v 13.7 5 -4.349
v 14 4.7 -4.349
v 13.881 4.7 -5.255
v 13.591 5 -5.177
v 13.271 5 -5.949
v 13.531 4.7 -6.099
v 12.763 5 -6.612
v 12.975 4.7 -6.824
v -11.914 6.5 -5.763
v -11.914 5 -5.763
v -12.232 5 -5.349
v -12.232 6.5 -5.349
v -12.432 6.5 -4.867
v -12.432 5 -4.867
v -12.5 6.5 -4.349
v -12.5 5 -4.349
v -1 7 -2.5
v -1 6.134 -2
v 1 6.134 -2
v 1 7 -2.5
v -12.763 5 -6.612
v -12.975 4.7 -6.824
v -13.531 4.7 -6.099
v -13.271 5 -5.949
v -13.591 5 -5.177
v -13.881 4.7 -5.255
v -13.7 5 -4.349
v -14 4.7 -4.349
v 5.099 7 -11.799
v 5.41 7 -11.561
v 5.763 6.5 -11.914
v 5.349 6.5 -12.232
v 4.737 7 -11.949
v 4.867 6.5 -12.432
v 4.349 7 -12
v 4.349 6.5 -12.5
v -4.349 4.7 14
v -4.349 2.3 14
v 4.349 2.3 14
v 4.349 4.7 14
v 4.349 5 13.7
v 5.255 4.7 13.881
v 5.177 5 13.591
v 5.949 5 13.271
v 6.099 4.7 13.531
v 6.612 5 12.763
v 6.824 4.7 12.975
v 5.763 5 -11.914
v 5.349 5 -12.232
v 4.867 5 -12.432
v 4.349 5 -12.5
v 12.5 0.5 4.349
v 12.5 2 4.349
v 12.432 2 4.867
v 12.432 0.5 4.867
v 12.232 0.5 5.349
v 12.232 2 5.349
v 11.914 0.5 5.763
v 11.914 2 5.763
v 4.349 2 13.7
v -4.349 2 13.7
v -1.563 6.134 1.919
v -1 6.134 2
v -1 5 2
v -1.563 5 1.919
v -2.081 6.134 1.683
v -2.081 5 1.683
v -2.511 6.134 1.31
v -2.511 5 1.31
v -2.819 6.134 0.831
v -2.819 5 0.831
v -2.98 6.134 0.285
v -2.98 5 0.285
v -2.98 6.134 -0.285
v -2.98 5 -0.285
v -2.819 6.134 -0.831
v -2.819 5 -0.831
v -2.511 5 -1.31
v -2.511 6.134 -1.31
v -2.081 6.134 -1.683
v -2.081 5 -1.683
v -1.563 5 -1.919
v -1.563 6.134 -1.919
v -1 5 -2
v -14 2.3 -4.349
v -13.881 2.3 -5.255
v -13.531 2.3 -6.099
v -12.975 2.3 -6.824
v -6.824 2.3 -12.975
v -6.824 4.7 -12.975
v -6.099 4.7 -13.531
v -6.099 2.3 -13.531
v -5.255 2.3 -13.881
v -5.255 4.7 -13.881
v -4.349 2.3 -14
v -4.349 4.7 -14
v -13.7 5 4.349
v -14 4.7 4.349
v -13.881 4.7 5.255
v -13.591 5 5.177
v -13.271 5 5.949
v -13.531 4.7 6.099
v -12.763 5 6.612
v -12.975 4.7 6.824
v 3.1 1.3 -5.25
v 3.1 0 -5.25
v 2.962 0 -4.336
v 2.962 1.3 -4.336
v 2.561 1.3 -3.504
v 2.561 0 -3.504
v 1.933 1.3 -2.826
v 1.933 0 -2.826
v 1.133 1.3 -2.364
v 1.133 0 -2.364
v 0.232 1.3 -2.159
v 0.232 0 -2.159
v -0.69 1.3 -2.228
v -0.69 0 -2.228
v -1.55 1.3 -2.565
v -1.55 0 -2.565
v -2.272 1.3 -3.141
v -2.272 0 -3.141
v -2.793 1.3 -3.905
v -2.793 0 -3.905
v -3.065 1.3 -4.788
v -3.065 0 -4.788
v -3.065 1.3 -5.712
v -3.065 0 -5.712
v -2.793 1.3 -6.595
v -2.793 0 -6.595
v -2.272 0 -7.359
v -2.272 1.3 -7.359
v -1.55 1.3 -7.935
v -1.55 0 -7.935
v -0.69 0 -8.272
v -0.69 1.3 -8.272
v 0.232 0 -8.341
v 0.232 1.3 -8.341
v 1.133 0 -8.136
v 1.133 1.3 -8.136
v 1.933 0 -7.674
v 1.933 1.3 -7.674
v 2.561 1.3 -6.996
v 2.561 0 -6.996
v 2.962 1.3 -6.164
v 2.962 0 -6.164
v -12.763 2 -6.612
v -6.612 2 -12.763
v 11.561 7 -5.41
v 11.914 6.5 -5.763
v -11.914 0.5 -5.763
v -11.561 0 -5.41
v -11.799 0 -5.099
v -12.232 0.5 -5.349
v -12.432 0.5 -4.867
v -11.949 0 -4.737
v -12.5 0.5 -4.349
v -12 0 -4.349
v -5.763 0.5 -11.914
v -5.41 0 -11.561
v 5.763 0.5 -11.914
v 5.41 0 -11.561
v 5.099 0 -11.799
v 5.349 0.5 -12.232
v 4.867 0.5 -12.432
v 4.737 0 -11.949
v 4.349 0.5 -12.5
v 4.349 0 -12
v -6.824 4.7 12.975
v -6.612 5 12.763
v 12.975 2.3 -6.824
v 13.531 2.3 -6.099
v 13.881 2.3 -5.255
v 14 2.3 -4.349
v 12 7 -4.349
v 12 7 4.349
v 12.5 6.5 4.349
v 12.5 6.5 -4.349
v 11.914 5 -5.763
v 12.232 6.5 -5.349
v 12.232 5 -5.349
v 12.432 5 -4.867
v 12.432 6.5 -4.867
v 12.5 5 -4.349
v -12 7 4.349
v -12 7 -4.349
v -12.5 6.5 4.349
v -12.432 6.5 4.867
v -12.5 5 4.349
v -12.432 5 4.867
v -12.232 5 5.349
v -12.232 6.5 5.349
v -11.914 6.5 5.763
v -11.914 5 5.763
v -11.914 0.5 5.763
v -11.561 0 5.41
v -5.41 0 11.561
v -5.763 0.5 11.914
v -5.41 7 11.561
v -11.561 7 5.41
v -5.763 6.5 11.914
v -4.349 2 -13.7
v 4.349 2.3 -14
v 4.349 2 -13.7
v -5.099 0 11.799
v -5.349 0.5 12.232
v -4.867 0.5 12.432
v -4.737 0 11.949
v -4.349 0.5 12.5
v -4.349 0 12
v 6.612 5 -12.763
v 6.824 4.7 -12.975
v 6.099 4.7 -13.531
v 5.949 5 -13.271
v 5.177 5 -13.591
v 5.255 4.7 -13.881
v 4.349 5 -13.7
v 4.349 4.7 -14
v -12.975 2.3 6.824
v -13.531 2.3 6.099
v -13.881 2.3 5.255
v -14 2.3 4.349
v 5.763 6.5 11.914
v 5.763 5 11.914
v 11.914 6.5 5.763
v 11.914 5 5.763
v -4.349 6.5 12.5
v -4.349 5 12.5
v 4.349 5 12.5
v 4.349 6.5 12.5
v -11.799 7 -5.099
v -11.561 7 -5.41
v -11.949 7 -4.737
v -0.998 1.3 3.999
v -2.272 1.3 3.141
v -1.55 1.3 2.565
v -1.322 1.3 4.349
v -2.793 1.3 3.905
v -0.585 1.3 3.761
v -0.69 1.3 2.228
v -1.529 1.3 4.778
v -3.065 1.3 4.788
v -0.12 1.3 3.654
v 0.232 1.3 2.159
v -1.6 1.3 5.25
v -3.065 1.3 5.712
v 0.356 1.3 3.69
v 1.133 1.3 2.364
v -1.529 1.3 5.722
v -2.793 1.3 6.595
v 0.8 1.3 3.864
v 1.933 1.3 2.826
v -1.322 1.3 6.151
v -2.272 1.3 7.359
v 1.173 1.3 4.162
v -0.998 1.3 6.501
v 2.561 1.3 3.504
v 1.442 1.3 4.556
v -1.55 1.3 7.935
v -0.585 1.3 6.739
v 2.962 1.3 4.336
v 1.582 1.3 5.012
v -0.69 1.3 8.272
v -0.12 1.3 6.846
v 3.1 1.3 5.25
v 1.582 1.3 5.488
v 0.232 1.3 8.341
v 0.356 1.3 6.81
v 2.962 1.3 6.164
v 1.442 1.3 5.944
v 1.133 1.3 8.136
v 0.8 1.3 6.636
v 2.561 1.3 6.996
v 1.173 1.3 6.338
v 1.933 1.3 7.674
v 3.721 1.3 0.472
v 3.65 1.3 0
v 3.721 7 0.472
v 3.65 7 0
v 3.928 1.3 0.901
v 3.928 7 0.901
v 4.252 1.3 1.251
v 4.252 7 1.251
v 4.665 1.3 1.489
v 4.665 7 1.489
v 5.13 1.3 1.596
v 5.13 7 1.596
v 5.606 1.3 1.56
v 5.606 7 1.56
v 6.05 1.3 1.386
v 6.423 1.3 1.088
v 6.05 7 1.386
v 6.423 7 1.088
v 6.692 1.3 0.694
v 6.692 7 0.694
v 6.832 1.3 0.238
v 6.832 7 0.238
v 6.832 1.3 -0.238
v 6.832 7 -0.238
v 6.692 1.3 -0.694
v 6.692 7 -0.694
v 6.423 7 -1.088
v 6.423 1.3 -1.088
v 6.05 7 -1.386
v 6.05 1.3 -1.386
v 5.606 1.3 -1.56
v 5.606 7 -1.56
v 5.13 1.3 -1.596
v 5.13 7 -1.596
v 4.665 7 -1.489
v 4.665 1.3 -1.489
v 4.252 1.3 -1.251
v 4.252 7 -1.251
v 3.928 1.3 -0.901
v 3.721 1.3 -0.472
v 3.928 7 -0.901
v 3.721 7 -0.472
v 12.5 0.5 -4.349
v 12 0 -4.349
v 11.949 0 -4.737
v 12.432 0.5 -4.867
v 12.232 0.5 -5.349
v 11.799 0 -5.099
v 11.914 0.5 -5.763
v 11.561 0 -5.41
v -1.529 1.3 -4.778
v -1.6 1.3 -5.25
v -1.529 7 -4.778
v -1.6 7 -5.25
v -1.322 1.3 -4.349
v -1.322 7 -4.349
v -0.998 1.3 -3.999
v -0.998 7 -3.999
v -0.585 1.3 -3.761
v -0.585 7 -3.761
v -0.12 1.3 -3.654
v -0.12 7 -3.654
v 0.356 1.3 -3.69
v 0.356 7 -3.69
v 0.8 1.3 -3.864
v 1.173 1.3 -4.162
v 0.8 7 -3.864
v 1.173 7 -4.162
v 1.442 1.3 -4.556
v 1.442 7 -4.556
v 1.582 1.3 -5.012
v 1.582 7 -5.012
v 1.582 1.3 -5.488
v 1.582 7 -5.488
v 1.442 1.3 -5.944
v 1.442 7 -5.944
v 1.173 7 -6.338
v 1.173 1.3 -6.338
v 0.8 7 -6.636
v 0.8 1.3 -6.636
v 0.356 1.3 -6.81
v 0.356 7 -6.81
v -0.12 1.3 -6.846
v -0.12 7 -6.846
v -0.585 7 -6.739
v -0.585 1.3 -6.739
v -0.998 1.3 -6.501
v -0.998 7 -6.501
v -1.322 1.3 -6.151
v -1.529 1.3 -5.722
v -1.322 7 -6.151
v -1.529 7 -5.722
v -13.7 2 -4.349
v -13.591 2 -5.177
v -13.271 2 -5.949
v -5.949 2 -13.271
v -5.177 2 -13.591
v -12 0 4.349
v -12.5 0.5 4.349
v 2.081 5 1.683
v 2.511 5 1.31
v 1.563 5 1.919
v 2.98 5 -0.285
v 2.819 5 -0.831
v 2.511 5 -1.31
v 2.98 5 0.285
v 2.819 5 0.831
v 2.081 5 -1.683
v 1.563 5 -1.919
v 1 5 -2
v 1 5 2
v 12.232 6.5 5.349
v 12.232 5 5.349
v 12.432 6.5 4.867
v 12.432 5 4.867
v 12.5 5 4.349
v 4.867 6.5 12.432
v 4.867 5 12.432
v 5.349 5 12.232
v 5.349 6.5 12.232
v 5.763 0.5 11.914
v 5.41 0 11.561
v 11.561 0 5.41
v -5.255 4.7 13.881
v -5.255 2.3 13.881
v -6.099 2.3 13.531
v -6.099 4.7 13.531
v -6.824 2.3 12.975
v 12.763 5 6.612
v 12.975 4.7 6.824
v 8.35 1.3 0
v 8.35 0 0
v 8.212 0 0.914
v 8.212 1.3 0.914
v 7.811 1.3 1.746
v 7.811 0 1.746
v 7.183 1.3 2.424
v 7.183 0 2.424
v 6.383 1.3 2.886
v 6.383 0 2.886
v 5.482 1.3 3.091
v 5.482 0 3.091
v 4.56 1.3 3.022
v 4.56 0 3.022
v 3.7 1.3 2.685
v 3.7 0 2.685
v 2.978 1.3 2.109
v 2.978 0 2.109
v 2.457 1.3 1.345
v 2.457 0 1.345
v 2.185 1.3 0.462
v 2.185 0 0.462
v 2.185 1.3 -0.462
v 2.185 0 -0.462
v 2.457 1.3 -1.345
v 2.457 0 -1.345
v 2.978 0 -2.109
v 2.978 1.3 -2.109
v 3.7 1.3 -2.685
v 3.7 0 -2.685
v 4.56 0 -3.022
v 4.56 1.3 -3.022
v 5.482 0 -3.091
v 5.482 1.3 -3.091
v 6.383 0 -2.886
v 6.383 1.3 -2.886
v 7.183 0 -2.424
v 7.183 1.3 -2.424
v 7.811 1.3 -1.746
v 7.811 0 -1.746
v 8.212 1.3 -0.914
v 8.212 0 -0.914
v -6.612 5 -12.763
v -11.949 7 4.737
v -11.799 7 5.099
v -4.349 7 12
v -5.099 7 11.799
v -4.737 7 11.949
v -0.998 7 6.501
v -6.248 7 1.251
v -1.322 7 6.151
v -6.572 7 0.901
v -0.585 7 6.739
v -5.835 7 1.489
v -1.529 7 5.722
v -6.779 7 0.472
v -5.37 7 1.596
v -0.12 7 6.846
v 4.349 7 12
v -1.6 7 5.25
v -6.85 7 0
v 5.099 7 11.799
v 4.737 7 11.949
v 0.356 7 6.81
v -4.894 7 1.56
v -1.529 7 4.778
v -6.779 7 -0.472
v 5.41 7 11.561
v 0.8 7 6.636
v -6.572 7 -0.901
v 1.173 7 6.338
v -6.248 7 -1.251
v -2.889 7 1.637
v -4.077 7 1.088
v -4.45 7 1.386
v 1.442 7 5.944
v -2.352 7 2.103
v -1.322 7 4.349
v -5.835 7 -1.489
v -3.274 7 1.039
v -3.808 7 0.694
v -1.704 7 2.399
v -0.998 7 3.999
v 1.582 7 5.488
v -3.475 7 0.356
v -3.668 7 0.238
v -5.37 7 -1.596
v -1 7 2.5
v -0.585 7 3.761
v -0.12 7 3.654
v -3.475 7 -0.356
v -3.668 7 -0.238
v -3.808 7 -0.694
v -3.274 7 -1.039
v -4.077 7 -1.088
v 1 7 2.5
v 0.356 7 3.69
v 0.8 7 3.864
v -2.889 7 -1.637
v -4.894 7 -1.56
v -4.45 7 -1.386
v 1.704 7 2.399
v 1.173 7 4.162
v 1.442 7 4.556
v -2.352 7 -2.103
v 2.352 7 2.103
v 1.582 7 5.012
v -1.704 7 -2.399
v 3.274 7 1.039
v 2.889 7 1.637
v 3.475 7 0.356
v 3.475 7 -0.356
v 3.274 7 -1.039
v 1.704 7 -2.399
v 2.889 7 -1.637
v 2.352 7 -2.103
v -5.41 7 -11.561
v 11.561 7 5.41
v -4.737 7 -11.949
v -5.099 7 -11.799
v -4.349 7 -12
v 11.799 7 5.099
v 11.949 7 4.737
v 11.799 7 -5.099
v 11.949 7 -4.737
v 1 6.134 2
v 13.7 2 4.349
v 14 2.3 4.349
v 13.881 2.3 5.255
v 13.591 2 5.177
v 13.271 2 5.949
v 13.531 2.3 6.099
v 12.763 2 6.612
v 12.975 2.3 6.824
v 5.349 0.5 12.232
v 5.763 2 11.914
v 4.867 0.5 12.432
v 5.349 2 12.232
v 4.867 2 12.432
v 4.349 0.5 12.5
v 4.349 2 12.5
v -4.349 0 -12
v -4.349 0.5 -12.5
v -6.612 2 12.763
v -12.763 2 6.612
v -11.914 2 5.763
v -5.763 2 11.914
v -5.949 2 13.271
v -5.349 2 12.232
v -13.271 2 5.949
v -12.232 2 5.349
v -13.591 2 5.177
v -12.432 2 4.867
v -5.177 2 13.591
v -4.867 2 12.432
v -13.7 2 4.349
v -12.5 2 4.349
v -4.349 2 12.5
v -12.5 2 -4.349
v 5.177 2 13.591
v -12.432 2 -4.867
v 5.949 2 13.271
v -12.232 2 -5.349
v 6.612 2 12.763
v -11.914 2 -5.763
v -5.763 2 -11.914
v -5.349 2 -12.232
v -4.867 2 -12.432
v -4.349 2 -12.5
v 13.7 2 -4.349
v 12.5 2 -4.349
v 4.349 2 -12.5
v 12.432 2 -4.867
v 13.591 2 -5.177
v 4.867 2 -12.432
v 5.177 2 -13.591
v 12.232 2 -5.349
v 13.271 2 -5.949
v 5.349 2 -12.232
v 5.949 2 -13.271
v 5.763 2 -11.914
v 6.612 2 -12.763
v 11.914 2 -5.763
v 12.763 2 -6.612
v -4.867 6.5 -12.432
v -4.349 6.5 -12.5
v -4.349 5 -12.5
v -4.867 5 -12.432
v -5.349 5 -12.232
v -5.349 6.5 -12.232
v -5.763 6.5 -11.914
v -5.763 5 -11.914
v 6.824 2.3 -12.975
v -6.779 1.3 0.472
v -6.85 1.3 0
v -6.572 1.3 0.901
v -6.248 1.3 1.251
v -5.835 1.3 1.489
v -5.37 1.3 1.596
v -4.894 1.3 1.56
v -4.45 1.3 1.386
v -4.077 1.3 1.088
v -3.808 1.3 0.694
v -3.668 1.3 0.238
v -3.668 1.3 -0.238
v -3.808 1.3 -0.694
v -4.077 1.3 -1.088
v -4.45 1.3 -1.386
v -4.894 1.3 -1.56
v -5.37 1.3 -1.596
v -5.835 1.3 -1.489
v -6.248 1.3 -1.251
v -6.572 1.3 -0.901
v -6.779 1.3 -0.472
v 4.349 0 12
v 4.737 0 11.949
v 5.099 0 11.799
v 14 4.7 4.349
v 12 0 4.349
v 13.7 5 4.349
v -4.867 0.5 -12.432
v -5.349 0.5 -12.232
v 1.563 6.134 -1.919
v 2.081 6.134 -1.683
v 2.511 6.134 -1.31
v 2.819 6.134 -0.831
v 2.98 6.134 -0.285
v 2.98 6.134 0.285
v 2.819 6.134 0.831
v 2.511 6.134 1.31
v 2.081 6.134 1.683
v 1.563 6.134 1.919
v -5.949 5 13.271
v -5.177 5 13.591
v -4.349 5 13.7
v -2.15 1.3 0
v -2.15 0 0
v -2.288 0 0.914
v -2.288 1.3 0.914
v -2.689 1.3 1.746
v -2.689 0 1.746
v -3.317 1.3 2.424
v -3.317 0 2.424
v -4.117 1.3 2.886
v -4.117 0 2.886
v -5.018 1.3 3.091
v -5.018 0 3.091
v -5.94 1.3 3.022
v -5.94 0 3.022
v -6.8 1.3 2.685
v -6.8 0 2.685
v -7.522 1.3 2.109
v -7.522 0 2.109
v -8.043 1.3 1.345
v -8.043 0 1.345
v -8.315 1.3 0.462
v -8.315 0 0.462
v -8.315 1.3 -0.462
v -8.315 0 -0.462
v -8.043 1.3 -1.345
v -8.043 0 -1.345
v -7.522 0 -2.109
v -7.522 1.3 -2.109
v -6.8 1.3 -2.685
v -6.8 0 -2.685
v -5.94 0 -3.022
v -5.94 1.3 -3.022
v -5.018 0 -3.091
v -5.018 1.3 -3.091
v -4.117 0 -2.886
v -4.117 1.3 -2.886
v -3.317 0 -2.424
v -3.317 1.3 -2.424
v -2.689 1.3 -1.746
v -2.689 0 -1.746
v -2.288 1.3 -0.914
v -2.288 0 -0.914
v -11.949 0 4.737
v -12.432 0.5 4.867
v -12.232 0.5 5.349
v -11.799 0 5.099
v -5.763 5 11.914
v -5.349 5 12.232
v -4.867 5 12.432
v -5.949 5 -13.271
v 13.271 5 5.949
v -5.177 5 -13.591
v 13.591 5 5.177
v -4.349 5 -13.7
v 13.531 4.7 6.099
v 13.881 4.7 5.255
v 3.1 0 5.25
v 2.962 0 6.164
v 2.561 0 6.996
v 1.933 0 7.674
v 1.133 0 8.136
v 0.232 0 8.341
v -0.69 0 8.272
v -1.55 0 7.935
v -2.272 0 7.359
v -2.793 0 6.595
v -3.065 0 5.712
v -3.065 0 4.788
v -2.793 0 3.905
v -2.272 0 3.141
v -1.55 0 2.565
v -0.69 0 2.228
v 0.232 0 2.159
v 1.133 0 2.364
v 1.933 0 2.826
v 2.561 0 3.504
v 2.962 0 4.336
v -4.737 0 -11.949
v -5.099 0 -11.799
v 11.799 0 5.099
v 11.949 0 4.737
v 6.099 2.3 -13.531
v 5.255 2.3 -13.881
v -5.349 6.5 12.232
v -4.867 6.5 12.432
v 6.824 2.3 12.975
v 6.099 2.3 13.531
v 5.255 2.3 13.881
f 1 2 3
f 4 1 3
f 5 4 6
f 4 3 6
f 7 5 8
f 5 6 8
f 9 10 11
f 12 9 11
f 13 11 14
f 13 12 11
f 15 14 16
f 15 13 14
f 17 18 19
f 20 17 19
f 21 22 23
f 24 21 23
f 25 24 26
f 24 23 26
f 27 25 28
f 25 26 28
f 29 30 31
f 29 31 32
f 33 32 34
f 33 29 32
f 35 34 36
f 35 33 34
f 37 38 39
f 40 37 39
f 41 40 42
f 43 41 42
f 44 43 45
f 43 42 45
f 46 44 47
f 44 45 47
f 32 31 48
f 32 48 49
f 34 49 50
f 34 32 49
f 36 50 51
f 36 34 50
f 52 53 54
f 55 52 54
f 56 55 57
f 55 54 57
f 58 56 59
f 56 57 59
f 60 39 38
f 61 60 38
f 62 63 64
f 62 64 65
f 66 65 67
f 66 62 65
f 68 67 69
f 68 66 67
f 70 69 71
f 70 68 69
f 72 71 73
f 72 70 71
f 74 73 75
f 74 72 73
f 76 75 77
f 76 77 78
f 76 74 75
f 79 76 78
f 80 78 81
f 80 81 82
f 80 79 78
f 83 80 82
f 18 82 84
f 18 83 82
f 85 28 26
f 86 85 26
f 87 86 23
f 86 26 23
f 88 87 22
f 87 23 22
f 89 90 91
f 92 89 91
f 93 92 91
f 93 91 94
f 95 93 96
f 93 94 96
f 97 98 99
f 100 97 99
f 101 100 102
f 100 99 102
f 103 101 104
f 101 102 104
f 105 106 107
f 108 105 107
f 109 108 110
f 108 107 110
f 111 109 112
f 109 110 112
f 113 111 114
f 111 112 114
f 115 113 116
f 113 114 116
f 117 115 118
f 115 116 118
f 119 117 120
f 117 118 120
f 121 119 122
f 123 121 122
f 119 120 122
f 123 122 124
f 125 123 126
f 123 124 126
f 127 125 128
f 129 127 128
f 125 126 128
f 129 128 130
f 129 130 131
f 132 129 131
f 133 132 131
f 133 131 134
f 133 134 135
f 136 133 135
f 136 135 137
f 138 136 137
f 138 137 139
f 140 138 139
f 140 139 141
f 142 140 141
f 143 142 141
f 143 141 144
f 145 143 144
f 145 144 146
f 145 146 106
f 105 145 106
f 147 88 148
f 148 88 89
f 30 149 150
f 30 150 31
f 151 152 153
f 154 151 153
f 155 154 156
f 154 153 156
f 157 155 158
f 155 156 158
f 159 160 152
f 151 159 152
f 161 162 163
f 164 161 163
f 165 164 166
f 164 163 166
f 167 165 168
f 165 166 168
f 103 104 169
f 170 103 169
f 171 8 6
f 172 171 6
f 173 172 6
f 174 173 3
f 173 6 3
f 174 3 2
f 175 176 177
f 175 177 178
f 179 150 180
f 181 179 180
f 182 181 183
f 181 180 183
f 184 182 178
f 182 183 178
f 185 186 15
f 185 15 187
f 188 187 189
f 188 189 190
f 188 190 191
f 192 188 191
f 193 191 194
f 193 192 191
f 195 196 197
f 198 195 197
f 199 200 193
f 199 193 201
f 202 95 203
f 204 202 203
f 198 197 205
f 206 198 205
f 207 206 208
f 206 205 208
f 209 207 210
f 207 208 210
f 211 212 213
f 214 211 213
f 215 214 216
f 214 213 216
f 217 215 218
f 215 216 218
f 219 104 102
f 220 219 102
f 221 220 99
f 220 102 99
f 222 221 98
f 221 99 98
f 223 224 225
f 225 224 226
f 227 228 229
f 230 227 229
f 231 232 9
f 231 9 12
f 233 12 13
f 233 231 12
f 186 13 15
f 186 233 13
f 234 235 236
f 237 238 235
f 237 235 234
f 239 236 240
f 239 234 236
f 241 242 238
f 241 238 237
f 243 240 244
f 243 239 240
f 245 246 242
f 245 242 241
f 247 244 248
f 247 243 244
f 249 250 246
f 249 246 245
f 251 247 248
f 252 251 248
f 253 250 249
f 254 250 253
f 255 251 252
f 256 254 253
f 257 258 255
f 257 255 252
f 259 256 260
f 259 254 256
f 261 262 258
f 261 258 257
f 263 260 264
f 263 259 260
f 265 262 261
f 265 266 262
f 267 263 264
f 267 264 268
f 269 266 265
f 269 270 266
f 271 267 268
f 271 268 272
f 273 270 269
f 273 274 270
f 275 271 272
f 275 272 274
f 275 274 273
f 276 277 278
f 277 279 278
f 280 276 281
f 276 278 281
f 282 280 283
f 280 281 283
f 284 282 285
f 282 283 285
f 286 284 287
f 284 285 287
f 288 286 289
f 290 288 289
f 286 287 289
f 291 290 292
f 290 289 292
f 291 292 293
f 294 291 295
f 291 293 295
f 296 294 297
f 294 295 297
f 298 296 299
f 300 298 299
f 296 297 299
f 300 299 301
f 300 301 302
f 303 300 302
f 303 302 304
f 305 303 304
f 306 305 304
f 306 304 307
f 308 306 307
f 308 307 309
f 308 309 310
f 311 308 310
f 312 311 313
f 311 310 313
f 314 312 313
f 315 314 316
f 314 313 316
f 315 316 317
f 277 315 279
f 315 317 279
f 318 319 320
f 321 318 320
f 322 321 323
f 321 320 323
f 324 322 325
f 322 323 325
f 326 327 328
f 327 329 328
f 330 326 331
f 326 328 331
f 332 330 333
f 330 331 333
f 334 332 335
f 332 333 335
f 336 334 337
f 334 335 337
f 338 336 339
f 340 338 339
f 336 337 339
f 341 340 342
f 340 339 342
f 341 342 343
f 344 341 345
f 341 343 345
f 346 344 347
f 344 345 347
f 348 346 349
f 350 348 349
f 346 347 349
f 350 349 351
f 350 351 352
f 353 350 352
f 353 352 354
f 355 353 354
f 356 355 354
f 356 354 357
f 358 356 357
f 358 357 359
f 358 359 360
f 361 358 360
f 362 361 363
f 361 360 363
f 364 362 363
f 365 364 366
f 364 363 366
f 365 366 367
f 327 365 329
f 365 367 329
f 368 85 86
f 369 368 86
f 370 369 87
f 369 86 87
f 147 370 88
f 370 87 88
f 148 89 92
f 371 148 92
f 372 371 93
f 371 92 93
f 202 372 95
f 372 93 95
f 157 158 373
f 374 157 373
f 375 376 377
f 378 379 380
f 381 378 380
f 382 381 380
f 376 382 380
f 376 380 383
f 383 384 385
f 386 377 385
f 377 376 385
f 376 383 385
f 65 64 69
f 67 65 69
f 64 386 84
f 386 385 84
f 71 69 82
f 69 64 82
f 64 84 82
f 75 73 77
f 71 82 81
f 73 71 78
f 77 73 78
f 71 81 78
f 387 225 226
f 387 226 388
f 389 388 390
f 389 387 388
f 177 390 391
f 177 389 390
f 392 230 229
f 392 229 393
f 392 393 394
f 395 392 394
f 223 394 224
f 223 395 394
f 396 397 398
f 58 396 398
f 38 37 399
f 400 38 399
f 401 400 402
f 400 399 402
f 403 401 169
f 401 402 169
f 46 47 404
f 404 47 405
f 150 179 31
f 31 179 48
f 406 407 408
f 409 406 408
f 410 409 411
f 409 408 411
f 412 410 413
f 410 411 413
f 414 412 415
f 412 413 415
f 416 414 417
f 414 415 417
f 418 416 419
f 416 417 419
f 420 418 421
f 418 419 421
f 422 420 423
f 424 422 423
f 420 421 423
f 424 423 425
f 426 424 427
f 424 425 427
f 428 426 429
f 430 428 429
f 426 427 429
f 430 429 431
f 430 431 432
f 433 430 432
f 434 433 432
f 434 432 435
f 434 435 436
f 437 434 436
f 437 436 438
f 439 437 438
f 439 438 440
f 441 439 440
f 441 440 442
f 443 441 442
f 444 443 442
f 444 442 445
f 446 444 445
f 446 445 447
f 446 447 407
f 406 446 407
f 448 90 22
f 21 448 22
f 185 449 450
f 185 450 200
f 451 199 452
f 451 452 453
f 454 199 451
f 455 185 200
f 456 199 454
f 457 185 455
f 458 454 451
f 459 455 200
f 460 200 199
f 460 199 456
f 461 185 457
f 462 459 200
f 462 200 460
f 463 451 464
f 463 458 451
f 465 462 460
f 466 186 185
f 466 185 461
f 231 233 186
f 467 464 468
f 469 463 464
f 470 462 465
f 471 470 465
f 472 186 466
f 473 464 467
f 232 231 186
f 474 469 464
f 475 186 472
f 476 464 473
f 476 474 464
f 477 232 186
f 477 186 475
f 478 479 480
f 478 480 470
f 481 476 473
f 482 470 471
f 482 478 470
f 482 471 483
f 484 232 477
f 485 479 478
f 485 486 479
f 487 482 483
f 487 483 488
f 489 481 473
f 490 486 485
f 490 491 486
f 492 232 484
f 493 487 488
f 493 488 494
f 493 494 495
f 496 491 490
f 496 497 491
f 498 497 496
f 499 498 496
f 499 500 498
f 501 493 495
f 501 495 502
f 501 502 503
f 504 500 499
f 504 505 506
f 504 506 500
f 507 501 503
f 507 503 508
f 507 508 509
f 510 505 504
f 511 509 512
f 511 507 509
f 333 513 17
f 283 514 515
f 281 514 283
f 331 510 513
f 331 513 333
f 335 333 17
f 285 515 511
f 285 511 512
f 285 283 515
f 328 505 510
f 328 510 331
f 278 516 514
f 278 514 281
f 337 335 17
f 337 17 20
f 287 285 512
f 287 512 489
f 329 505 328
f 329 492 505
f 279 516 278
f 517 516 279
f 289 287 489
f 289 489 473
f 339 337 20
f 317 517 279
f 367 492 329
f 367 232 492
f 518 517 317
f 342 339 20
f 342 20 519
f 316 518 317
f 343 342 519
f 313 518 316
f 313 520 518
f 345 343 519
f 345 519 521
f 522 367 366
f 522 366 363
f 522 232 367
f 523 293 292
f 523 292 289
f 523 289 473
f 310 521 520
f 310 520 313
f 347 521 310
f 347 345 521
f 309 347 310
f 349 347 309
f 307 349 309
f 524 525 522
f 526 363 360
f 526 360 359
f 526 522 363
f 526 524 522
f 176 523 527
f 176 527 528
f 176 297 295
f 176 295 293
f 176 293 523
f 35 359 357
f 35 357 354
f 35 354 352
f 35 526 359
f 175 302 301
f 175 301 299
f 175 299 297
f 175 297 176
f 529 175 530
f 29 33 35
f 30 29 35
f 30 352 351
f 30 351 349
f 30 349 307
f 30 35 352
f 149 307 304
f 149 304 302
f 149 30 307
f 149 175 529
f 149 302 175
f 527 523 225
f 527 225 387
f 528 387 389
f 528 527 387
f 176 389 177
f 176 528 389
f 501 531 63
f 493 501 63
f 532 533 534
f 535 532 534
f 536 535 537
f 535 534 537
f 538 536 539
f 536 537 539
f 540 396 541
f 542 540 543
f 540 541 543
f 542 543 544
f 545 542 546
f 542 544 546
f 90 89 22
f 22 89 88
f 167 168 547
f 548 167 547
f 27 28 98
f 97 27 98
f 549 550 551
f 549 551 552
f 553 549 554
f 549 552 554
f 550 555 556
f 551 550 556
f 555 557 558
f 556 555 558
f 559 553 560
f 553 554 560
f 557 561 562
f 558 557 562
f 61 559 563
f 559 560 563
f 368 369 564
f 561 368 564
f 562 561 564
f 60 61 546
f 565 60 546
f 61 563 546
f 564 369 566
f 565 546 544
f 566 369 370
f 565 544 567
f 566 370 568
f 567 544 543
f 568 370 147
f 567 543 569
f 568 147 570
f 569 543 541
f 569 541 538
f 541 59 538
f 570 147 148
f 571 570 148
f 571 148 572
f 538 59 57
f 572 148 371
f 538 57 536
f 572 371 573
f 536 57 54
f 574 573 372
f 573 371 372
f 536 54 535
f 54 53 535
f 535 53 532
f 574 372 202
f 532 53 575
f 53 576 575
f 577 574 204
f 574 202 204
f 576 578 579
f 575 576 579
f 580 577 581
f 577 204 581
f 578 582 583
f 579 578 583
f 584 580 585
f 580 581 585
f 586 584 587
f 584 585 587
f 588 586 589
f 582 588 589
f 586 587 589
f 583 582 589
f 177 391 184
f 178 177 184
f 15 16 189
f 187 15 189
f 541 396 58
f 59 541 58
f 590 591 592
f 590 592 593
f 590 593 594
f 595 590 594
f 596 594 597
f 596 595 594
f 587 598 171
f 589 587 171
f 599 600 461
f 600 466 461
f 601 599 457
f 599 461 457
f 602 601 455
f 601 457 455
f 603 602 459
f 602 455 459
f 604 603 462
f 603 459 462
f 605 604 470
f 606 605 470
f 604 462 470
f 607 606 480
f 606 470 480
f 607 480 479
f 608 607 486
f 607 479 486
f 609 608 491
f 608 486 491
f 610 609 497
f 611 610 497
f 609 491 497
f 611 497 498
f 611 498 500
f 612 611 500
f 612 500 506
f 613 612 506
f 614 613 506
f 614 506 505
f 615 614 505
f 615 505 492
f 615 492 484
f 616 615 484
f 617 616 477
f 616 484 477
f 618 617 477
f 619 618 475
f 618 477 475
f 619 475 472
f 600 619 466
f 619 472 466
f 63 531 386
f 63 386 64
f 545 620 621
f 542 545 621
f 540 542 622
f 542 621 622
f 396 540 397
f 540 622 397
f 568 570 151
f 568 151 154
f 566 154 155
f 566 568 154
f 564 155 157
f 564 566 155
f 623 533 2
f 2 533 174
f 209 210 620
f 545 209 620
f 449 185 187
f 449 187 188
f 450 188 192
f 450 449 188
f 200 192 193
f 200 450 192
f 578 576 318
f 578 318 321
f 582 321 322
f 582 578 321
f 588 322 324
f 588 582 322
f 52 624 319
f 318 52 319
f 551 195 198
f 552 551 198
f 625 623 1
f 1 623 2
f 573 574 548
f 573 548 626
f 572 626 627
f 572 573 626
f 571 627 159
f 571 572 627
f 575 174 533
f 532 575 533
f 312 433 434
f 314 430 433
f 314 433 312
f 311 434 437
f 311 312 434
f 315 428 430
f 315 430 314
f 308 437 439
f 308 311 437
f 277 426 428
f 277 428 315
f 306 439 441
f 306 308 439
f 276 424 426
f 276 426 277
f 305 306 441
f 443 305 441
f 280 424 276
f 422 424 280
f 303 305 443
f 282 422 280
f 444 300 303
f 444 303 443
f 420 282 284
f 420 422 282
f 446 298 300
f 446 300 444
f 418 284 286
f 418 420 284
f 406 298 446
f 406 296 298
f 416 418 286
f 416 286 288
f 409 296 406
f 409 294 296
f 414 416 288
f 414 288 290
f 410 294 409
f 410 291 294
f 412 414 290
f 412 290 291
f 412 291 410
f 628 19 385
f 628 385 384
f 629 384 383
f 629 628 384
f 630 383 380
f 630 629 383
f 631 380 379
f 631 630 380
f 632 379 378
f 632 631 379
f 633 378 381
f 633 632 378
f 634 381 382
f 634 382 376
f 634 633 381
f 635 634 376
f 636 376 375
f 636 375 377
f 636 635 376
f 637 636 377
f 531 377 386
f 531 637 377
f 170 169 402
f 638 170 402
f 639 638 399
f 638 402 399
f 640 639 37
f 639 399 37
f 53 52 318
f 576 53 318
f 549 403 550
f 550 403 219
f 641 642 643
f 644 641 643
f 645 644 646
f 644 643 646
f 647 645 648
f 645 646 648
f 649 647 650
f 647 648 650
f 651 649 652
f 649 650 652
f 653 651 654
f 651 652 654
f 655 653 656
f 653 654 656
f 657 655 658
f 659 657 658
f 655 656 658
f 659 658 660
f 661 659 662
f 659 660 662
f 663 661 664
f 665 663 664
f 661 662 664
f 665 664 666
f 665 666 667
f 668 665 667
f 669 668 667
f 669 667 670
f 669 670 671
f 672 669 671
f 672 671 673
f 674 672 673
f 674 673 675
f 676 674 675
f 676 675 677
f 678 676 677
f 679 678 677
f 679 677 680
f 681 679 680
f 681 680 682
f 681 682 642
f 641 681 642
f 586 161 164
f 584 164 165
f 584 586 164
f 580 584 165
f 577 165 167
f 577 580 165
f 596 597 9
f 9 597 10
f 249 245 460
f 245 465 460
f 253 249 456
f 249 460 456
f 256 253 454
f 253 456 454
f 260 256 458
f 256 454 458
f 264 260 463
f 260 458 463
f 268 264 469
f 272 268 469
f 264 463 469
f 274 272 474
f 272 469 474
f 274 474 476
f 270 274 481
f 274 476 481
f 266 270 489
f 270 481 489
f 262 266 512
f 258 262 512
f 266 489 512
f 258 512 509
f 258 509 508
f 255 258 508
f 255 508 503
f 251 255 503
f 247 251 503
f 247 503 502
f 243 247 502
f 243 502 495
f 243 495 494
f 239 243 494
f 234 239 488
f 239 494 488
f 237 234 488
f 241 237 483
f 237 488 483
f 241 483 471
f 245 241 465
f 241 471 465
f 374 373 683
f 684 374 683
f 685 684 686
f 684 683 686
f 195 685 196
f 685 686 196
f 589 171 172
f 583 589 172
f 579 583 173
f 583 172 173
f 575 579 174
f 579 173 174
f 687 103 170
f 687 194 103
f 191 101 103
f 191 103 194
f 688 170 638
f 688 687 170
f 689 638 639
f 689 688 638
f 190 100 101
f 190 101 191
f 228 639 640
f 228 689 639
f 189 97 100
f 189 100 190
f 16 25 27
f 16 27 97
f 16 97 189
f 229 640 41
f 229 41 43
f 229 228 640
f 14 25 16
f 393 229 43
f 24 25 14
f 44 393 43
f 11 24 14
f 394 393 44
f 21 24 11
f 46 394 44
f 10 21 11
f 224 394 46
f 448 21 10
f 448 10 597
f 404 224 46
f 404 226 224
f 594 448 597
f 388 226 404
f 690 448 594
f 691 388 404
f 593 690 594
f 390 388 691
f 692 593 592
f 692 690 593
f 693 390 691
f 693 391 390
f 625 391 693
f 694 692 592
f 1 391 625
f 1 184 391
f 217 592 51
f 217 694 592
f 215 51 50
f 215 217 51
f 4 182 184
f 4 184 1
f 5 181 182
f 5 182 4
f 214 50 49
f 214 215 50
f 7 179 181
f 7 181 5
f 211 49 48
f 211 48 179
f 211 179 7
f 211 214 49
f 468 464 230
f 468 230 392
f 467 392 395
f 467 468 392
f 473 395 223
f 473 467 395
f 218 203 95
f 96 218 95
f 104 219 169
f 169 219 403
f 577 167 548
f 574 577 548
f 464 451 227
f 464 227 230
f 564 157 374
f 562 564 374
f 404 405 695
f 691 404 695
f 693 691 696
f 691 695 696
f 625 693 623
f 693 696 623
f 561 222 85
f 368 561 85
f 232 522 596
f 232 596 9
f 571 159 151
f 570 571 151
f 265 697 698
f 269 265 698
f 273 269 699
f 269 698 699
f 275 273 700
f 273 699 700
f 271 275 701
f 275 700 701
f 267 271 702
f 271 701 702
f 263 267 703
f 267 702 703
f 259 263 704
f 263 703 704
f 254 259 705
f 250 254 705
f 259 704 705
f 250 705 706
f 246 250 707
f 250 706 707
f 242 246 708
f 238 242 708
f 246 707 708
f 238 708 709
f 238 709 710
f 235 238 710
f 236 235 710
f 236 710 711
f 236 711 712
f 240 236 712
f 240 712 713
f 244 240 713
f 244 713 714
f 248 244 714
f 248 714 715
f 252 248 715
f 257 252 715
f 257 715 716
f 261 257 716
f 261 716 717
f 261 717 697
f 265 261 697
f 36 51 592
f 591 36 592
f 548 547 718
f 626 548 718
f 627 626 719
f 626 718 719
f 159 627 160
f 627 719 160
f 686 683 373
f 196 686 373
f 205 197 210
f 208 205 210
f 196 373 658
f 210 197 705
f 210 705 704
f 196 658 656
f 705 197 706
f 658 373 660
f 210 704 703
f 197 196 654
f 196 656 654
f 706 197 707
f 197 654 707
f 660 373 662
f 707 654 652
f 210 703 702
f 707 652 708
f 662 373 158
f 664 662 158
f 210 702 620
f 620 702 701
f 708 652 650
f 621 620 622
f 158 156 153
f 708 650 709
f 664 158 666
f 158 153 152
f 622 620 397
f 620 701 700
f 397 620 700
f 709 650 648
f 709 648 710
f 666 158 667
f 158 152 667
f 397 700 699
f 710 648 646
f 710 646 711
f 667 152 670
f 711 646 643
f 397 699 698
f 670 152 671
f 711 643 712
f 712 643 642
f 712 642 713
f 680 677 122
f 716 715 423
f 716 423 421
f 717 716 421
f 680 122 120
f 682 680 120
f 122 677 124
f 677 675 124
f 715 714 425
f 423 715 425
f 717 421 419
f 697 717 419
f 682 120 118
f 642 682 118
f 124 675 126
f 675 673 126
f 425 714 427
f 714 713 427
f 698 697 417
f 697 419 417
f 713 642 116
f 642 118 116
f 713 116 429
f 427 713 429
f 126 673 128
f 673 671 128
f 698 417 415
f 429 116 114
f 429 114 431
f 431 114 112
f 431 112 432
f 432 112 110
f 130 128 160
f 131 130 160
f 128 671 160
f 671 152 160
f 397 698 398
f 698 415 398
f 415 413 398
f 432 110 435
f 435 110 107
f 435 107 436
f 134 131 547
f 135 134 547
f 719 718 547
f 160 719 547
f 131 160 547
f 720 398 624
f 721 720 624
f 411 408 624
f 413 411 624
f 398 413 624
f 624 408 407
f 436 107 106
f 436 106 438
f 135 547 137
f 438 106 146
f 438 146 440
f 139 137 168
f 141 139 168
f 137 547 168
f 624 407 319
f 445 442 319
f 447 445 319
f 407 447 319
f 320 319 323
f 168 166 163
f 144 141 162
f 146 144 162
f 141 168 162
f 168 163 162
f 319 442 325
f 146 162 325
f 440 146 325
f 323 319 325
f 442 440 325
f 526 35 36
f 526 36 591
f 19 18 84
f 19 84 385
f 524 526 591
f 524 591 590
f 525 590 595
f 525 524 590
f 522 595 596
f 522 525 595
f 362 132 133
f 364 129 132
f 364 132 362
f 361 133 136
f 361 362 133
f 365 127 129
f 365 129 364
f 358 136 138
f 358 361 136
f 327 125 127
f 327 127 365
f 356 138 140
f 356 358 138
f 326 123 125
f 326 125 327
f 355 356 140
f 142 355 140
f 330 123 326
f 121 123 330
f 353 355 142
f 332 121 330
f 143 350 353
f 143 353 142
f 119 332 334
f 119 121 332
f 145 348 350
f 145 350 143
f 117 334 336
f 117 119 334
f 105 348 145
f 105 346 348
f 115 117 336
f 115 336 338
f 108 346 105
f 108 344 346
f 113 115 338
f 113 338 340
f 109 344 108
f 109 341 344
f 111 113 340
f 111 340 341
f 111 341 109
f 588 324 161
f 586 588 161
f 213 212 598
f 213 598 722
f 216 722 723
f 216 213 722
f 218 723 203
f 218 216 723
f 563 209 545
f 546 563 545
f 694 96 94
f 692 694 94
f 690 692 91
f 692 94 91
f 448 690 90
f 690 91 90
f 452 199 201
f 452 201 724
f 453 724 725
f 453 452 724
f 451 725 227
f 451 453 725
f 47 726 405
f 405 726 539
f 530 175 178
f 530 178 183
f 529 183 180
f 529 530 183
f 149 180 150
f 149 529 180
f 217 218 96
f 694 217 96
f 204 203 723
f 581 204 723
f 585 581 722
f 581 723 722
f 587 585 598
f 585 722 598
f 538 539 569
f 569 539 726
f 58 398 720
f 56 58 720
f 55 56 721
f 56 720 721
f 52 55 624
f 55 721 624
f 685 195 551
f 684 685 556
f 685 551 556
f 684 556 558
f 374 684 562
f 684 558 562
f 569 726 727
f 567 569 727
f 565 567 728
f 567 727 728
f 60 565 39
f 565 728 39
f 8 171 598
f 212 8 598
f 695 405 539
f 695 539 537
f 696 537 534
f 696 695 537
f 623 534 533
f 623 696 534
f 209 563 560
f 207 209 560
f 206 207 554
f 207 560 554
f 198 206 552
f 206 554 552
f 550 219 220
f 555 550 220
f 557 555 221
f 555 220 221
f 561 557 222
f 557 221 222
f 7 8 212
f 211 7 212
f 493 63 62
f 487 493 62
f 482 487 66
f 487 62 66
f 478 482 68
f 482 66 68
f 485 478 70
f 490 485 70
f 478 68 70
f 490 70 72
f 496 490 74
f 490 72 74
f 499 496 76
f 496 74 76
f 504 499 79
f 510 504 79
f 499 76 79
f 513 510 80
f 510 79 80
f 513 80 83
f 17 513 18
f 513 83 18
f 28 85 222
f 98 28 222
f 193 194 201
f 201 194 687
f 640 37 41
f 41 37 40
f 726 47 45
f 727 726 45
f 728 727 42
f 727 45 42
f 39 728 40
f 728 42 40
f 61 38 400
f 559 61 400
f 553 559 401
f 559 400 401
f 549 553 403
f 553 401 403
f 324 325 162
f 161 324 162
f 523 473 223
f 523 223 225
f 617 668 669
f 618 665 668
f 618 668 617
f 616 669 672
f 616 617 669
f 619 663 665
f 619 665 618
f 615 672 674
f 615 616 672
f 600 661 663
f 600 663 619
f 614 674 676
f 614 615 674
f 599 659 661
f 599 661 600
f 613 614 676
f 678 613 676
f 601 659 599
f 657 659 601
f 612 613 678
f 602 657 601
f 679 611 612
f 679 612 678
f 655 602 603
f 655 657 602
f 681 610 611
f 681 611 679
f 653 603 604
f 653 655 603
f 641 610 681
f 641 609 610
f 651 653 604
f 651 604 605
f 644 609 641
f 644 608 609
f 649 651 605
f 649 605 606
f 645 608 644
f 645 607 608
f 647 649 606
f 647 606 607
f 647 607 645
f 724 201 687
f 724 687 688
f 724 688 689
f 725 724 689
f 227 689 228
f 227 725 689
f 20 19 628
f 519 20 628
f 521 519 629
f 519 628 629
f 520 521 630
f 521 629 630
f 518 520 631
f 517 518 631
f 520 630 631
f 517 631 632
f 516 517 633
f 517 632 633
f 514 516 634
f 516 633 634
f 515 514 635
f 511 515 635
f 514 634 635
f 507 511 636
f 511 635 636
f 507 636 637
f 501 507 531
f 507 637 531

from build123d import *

# Parameters (mm, degrees)
EXTRUDE_1_DEPTH              = 7
HOLE_WIZARD_M3_2_D           = 3.2
HOLE_WIZARD_M3_2_DEPTH       = 7
HOLE_WIZARD_M3_2_CBORE_D     = 6.2
HOLE_WIZARD_M3_2_CBORE_DEPTH = 1.3
HOLE_WIZARD_M3_2_TIP         = 0.96137699
CUT_EXTRUDE_1_DEPTH          = 2
EXTRUDE_START                = -3.5
EXTRUDE_3_DEPTH              = 1.5
FILLET_1_R                   = 2
CHAMFER_1_SIZE               = 0.5
CHAMFER_1_SIZE2              = 0.866025404
FILLET_2_R                   = 1
CHAMFER_2_SIZE               = 0.5
DELETE_START                 = 2
DELETE_FACE_1_DEPTH          = 3
DELETE_FACE_2_DEPTH          = 3
FILLET_3_R                   = 3.5
CHAMFER_3_SIZE               = 0.3


with BuildPart() as part:
    # 草图1 → 凸台-拉伸1 (new body)
    with BuildSketch(Plane(origin=(0, 0, 0), x_dir=(1, 0, 0), z_dir=(0, 1, 0))):
        Polygon((12.5, -5.17766953), (12.5, 5.17766953), (5.17766953, 12.5), (-5.17766953, 12.5), (-12.5, 5.17766953), (-12.5, -5.17766953), (-5.17766953, -12.5), (5.17766953, -12.5), align=None)
    extrude(amount=EXTRUDE_1_DEPTH)

    # M3 六角圆柱头螺钉的柱形沉头孔2
    with Locations(Plane.XZ):
        with Locations((-5.25, 0), (0, 5.25), (5.25, 0), (0, -5.25)):
            CounterBoreHole(HOLE_WIZARD_M3_2_D / 2, HOLE_WIZARD_M3_2_CBORE_D / 2, HOLE_WIZARD_M3_2_CBORE_DEPTH, depth=HOLE_WIZARD_M3_2_DEPTH)
            with Locations((0, 0, -(HOLE_WIZARD_M3_2_DEPTH + HOLE_WIZARD_M3_2_TIP / 2))):  # 118° drill point
                Cone(0, HOLE_WIZARD_M3_2_D / 2, HOLE_WIZARD_M3_2_TIP, mode=Mode.SUBTRACT)

    # 草图7 → 切除-拉伸1 (cut)
    with BuildSketch(Plane(origin=(0, 7, 0), x_dir=(1, 0, 0), z_dir=(0, 1, 0))):
        with BuildLine():
            Line((-1, 2), (1, 2))
            ThreePointArc((1, 2), (3, 0), (1, -2))
            Line((1, -2), (-1, -2))
            ThreePointArc((-1, -2), (-3, 0), (-1, 2))
        make_face()
    extrude(amount=-CUT_EXTRUDE_1_DEPTH, mode=Mode.SUBTRACT)

    # 草图8 → 凸台-拉伸3 (add, symmetric)
    with BuildSketch(Plane(origin=(0, 7, 0), x_dir=(1, 0, 0), z_dir=(0, 1, 0)).offset(EXTRUDE_START)):
        Polygon((5.798989873, 14), (-5.798989873, 14), (-14, 5.798989873), (-14, -5.798989873), (-5.798989873, -14), (5.798989873, -14), (14, -5.798989873), (14, 5.798989873), align=None)
        Polygon((12.5, 5.17766953), (5.17766953, 12.5), (-5.17766953, 12.5), (-12.5, 5.17766953), (-12.5, -5.17766953), (-5.17766953, -12.5), (5.17766953, -12.5), (12.5, -5.17766953), align=None, mode=Mode.SUBTRACT)
    extrude(amount=EXTRUDE_3_DEPTH, both=True)

    # 圆角1
    fillet_1_edges = [part.edges().sort_by_distance(p)[0] for p in [
        (5.17766953, 6, 12.5),
        (-5.17766953, 6, 12.5),
        (-12.5, 6, 5.17766953),
        (-12.5, 6, -5.17766953),
        (-5.17766953, 6, -12.5),
        (5.17766953, 6, -12.5),
        (12.5, 6, -5.17766953),
        (12.5, 6, 5.17766953),
        (5.17766953, 1, 12.5),
        (-5.17766953, 1, 12.5),
        (-12.5, 1, 5.17766953),
        (-12.5, 1, -5.17766953),
        (-5.17766953, 1, -12.5),
        (5.17766953, 1, -12.5),
        (12.5, 1, -5.17766953),
        (12.5, 1, 5.17766953),
        (14, 3.5, -5.798989873),
        (5.798989873, 3.5, -14),
        (-5.798989873, 3.5, -14),
        (-14, 3.5, -5.798989873),
        (-14, 3.5, 5.798989873),
        (-5.798989873, 3.5, 14),
        (5.798989873, 3.5, 14),
        (14, 3.5, 5.798989873),
    ]]
    fillet(fillet_1_edges, radius=FILLET_1_R)

    # 倒角1
    chamfer_1_edges = [part.edges().sort_by_distance(p)[0] for p in [
        (-3, 7, 0),
        (0, 7, 2),
        (3, 7, 0),
        (0, 7, -2),
    ]]
    chamfer_1_side = [part.faces().sort_by_distance(p)[0] for p in [
        (12.146446609, 7, 0),
    ]]
    chamfer(chamfer_1_edges, length=CHAMFER_1_SIZE, length2=CHAMFER_1_SIZE2, reference=chamfer_1_side[0])

    # 圆角2
    fillet_2_edges = [part.edges().sort_by_distance(p)[0] for p in [
        (9.899494937, 2, -9.899494937),
        (9.899494937, 5, -9.899494937),
        (14, 2, 0),
        (9.899494937, 2, 9.899494937),
        (0, 2, 14),
        (-9.899494937, 2, 9.899494937),
        (-14, 2, 0),
        (-9.899494937, 2, -9.899494937),
        (0, 2, -14),
        (-13.847759065, 2, -5.735929613),
        (5.735929613, 2, -13.847759065),
        (-5.735929613, 2, -13.847759065),
        (-13.847759065, 2, 5.735929613),
        (-5.735929613, 2, 13.847759065),
        (5.735929613, 2, 13.847759065),
        (13.847759065, 2, 5.735929613),
        (13.847759065, 2, -5.735929613),
        (14, 5, 0),
        (0, 5, -14),
        (-9.899494937, 5, -9.899494937),
        (-14, 5, 0),
        (-9.899494937, 5, 9.899494937),
        (0, 5, 14),
        (9.899494937, 5, 9.899494937),
        (-13.847759065, 5, -5.735929613),
        (5.735929613, 5, -13.847759065),
        (-5.735929613, 5, -13.847759065),
        (-13.847759065, 5, 5.735929613),
        (-5.735929613, 5, 13.847759065),
        (5.735929613, 5, 13.847759065),
        (13.847759065, 5, 5.735929613),
        (13.847759065, 5, -5.735929613),
    ]]
    fillet(fillet_2_edges, radius=FILLET_2_R)

    # 倒角2
    chamfer_2_edges = [part.edges().sort_by_distance(p)[0] for p in [
        (12.5, 0, 0),
        (8.838834765, 0, 8.838834765),
        (0, 0, 12.5),
        (-8.838834765, 0, 8.838834765),
        (-12.5, 0, 0),
        (-8.838834765, 0, -8.838834765),
        (0, 0, -12.5),
        (8.838834765, 0, -8.838834765),
        (-12.347759065, 0, -5.11460927),
        (12.347759065, 0, -5.11460927),
        (5.11460927, 0, -12.347759065),
        (-5.11460927, 0, -12.347759065),
        (-12.347759065, 0, 5.11460927),
        (-5.11460927, 0, 12.347759065),
        (5.11460927, 0, 12.347759065),
        (12.347759065, 0, 5.11460927),
        (0, 7, 12.5),
        (-8.838834765, 7, 8.838834765),
        (8.838834765, 7, 8.838834765),
        (12.5, 7, 0),
        (8.838834765, 7, -8.838834765),
        (0, 7, -12.5),
        (-8.838834765, 7, -8.838834765),
        (-12.5, 7, 0),
        (12.347759065, 7, 5.11460927),
        (5.11460927, 7, 12.347759065),
        (12.347759065, 7, -5.11460927),
        (5.11460927, 7, -12.347759065),
        (-5.11460927, 7, -12.347759065),
        (-12.347759065, 7, -5.11460927),
        (-12.347759065, 7, 5.11460927),
        (-5.11460927, 7, 12.347759065),
    ]]
    chamfer(chamfer_2_edges, length=CHAMFER_2_SIZE)

    # Delete Face 1: read off the stored shape, not the designer's step
    # Delete Face 1 outline → Delete Face 1 (add)
    with BuildSketch(Plane(origin=(0, 0, 0), x_dir=(1, 0, 0), z_dir=(0, 1, 0)).offset(DELETE_START)):
        with BuildLine():
            ThreePointArc((13.414213562, -6.384776311), (13.847759065, -5.735929613), (14, -4.970562748))
            Line((14, -4.970562748), (14, 4.970562748))
            ThreePointArc((14, 4.970562748), (13.847759065, 5.735929613), (13.414213562, 6.384776311))
            Line((13.414213562, 6.384776311), (6.384776311, 13.414213562))
            ThreePointArc((6.384776311, 13.414213562), (5.735929613, 13.847759065), (4.970562748, 14))
            Line((4.970562748, 14), (-4.970562748, 14))
            ThreePointArc((-4.970562748, 14), (-5.735929613, 13.847759065), (-6.384776311, 13.414213562))
            Line((-6.384776311, 13.414213562), (-13.414213562, 6.384776311))
            ThreePointArc((-13.414213562, 6.384776311), (-13.847759065, 5.735929613), (-14, 4.970562748))
            Line((-14, 4.970562748), (-14, -4.970562748))
            ThreePointArc((-14, -4.970562748), (-13.847759065, -5.735929613), (-13.414213562, -6.384776311))
            Line((-13.414213562, -6.384776311), (-6.384776311, -13.414213562))
            ThreePointArc((-6.384776311, -13.414213562), (-5.735929613, -13.847759065), (-4.970562748, -14))
            Line((-4.970562748, -14), (4.970562748, -14))
            ThreePointArc((4.970562748, -14), (5.735929613, -13.847759065), (6.384776311, -13.414213562))
            Line((6.384776311, -13.414213562), (13.414213562, -6.384776311))
        make_face()
        with BuildLine():
            ThreePointArc((4.349242405, 12.5), (5.11460927, 12.347759065), (5.763455967, 11.914213562))
            Line((5.763455967, 11.914213562), (11.914213562, 5.763455967))
            ThreePointArc((11.914213562, 5.763455967), (12.347759065, 5.11460927), (12.5, 4.349242405))
            Line((12.5, 4.349242405), (12.5, -4.349242405))
            ThreePointArc((12.5, -4.349242405), (12.347759065, -5.11460927), (11.914213562, -5.763455967))
            Line((11.914213562, -5.763455967), (5.763455967, -11.914213562))
            ThreePointArc((5.763455967, -11.914213562), (5.11460927, -12.347759065), (4.349242405, -12.5))
            Line((4.349242405, -12.5), (-4.349242405, -12.5))
            ThreePointArc((-4.349242405, -12.5), (-5.11460927, -12.347759065), (-5.763455967, -11.914213562))
            Line((-5.763455967, -11.914213562), (-11.914213562, -5.763455967))
            ThreePointArc((-11.914213562, -5.763455967), (-12.347759065, -5.11460927), (-12.5, -4.349242405))
            Line((-12.5, -4.349242405), (-12.5, 4.349242405))
            ThreePointArc((-12.5, 4.349242405), (-12.347759065, 5.11460927), (-11.914213562, 5.763455967))
            Line((-11.914213562, 5.763455967), (-5.763455967, 11.914213562))
            ThreePointArc((-5.763455967, 11.914213562), (-5.11460927, 12.347759065), (-4.349242405, 12.5))
            Line((-4.349242405, 12.5), (4.349242405, 12.5))
        make_face(mode=Mode.SUBTRACT)
    extrude(amount=DELETE_FACE_1_DEPTH)

    # Delete Face 2: read off the stored shape, not the designer's step
    # Delete Face 2 outline → Delete Face 2 (add)
    with BuildSketch(Plane(origin=(0, 0, 0), x_dir=(1, 0, 0), z_dir=(0, 1, 0)).offset(DELETE_START)):
        with BuildLine():
            Line((14, 5.798989873), (13.414213562, 6.384776311))
            ThreePointArc((13.414213562, 6.384776311), (13.847759065, 5.735929613), (14, 4.970562748))
            Line((14, 4.970562748), (14, 5.798989873))
        make_face()
        with BuildLine():
            ThreePointArc((4.970562748, 14), (5.735929613, 13.847759065), (6.384776311, 13.414213562))
            Line((6.384776311, 13.414213562), (5.798989873, 14))
            Line((5.798989873, 14), (4.970562748, 14))
        make_face()
        with BuildLine():
            Line((14, -5.798989873), (14, -4.970562748))
            ThreePointArc((14, -4.970562748), (13.847759065, -5.735929613), (13.414213562, -6.384776311))
            Line((13.414213562, -6.384776311), (14, -5.798989873))
        make_face()
        with BuildLine():
            ThreePointArc((-6.384776311, 13.414213562), (-5.735929613, 13.847759065), (-4.970562748, 14))
            Line((-4.970562748, 14), (-5.798989873, 14))
            Line((-5.798989873, 14), (-6.384776311, 13.414213562))
        make_face()
        with BuildLine():
            Line((5.798989873, -14), (6.384776311, -13.414213562))
            ThreePointArc((6.384776311, -13.414213562), (5.735929613, -13.847759065), (4.970562748, -14))
            Line((4.970562748, -14), (5.798989873, -14))
        make_face()
        with BuildLine():
            ThreePointArc((-14, 4.970562748), (-13.847759065, 5.735929613), (-13.414213562, 6.384776311))
            Line((-13.414213562, 6.384776311), (-14, 5.798989873))
            Line((-14, 5.798989873), (-14, 4.970562748))
        make_face()
        with BuildLine():
            Line((-5.798989873, -14), (-4.970562748, -14))
            ThreePointArc((-4.970562748, -14), (-5.735929613, -13.847759065), (-6.384776311, -13.414213562))
            Line((-6.384776311, -13.414213562), (-5.798989873, -14))
        make_face()
        with BuildLine():
            ThreePointArc((-13.414213562, -6.384776311), (-13.847759065, -5.735929613), (-14, -4.970562748))
            Line((-14, -4.970562748), (-14, -5.798989873))
            Line((-14, -5.798989873), (-13.414213562, -6.384776311))
        make_face()
    extrude(amount=DELETE_FACE_2_DEPTH)

    # 圆角3
    fillet_3_edges = [part.edges().sort_by_distance(p)[0] for p in [
        (14, 3.5, -5.798989873),
        (14, 3.5, 5.798989873),
        (5.798989873, 3.5, 14),
        (-5.798989873, 3.5, 14),
        (-14, 3.5, 5.798989873),
        (-14, 3.5, -5.798989873),
        (-5.798989873, 3.5, -14),
        (5.798989873, 3.5, -14),
    ]]
    fillet(fillet_3_edges, radius=FILLET_3_R)

    # 倒角3
    chamfer_3_edges = [part.edges().sort_by_distance(p)[0] for p in [
        (9.899494937, 2, 9.899494936),
        (9.899494937, 5, 9.899494936),
        (9.899494936, 2, -9.899494937),
        (14, 2, 0),
        (0, 2, 14),
        (-9.899494936, 2, 9.899494937),
        (-14, 2, 0),
        (-9.899494937, 2, -9.899494936),
        (0, 2, -14),
        (-5.688634418, 2, 13.733578364),
        (-13.733578364, 2, 5.688634418),
        (-13.733578364, 2, -5.688634418),
        (-5.688634418, 2, -13.733578364),
        (5.688634418, 2, -13.733578364),
        (13.733578364, 2, -5.688634418),
        (13.733578364, 2, 5.688634418),
        (5.688634418, 2, 13.733578364),
        (0, 5, 14),
        (14, 5, 0),
        (9.899494936, 5, -9.899494937),
        (0, 5, -14),
        (-9.899494937, 5, -9.899494936),
        (-14, 5, 0),
        (-9.899494936, 5, 9.899494937),
        (-5.688634418, 5, 13.733578364),
        (-13.733578364, 5, 5.688634418),
        (-13.733578364, 5, -5.688634418),
        (-5.688634418, 5, -13.733578364),
        (5.688634418, 5, -13.733578364),
        (13.733578364, 5, -5.688634418),
        (13.733578364, 5, 5.688634418),
        (5.688634418, 5, 13.733578364),
    ]]
    chamfer(chamfer_3_edges, length=CHAMFER_3_SIZE)


solid = part.part
